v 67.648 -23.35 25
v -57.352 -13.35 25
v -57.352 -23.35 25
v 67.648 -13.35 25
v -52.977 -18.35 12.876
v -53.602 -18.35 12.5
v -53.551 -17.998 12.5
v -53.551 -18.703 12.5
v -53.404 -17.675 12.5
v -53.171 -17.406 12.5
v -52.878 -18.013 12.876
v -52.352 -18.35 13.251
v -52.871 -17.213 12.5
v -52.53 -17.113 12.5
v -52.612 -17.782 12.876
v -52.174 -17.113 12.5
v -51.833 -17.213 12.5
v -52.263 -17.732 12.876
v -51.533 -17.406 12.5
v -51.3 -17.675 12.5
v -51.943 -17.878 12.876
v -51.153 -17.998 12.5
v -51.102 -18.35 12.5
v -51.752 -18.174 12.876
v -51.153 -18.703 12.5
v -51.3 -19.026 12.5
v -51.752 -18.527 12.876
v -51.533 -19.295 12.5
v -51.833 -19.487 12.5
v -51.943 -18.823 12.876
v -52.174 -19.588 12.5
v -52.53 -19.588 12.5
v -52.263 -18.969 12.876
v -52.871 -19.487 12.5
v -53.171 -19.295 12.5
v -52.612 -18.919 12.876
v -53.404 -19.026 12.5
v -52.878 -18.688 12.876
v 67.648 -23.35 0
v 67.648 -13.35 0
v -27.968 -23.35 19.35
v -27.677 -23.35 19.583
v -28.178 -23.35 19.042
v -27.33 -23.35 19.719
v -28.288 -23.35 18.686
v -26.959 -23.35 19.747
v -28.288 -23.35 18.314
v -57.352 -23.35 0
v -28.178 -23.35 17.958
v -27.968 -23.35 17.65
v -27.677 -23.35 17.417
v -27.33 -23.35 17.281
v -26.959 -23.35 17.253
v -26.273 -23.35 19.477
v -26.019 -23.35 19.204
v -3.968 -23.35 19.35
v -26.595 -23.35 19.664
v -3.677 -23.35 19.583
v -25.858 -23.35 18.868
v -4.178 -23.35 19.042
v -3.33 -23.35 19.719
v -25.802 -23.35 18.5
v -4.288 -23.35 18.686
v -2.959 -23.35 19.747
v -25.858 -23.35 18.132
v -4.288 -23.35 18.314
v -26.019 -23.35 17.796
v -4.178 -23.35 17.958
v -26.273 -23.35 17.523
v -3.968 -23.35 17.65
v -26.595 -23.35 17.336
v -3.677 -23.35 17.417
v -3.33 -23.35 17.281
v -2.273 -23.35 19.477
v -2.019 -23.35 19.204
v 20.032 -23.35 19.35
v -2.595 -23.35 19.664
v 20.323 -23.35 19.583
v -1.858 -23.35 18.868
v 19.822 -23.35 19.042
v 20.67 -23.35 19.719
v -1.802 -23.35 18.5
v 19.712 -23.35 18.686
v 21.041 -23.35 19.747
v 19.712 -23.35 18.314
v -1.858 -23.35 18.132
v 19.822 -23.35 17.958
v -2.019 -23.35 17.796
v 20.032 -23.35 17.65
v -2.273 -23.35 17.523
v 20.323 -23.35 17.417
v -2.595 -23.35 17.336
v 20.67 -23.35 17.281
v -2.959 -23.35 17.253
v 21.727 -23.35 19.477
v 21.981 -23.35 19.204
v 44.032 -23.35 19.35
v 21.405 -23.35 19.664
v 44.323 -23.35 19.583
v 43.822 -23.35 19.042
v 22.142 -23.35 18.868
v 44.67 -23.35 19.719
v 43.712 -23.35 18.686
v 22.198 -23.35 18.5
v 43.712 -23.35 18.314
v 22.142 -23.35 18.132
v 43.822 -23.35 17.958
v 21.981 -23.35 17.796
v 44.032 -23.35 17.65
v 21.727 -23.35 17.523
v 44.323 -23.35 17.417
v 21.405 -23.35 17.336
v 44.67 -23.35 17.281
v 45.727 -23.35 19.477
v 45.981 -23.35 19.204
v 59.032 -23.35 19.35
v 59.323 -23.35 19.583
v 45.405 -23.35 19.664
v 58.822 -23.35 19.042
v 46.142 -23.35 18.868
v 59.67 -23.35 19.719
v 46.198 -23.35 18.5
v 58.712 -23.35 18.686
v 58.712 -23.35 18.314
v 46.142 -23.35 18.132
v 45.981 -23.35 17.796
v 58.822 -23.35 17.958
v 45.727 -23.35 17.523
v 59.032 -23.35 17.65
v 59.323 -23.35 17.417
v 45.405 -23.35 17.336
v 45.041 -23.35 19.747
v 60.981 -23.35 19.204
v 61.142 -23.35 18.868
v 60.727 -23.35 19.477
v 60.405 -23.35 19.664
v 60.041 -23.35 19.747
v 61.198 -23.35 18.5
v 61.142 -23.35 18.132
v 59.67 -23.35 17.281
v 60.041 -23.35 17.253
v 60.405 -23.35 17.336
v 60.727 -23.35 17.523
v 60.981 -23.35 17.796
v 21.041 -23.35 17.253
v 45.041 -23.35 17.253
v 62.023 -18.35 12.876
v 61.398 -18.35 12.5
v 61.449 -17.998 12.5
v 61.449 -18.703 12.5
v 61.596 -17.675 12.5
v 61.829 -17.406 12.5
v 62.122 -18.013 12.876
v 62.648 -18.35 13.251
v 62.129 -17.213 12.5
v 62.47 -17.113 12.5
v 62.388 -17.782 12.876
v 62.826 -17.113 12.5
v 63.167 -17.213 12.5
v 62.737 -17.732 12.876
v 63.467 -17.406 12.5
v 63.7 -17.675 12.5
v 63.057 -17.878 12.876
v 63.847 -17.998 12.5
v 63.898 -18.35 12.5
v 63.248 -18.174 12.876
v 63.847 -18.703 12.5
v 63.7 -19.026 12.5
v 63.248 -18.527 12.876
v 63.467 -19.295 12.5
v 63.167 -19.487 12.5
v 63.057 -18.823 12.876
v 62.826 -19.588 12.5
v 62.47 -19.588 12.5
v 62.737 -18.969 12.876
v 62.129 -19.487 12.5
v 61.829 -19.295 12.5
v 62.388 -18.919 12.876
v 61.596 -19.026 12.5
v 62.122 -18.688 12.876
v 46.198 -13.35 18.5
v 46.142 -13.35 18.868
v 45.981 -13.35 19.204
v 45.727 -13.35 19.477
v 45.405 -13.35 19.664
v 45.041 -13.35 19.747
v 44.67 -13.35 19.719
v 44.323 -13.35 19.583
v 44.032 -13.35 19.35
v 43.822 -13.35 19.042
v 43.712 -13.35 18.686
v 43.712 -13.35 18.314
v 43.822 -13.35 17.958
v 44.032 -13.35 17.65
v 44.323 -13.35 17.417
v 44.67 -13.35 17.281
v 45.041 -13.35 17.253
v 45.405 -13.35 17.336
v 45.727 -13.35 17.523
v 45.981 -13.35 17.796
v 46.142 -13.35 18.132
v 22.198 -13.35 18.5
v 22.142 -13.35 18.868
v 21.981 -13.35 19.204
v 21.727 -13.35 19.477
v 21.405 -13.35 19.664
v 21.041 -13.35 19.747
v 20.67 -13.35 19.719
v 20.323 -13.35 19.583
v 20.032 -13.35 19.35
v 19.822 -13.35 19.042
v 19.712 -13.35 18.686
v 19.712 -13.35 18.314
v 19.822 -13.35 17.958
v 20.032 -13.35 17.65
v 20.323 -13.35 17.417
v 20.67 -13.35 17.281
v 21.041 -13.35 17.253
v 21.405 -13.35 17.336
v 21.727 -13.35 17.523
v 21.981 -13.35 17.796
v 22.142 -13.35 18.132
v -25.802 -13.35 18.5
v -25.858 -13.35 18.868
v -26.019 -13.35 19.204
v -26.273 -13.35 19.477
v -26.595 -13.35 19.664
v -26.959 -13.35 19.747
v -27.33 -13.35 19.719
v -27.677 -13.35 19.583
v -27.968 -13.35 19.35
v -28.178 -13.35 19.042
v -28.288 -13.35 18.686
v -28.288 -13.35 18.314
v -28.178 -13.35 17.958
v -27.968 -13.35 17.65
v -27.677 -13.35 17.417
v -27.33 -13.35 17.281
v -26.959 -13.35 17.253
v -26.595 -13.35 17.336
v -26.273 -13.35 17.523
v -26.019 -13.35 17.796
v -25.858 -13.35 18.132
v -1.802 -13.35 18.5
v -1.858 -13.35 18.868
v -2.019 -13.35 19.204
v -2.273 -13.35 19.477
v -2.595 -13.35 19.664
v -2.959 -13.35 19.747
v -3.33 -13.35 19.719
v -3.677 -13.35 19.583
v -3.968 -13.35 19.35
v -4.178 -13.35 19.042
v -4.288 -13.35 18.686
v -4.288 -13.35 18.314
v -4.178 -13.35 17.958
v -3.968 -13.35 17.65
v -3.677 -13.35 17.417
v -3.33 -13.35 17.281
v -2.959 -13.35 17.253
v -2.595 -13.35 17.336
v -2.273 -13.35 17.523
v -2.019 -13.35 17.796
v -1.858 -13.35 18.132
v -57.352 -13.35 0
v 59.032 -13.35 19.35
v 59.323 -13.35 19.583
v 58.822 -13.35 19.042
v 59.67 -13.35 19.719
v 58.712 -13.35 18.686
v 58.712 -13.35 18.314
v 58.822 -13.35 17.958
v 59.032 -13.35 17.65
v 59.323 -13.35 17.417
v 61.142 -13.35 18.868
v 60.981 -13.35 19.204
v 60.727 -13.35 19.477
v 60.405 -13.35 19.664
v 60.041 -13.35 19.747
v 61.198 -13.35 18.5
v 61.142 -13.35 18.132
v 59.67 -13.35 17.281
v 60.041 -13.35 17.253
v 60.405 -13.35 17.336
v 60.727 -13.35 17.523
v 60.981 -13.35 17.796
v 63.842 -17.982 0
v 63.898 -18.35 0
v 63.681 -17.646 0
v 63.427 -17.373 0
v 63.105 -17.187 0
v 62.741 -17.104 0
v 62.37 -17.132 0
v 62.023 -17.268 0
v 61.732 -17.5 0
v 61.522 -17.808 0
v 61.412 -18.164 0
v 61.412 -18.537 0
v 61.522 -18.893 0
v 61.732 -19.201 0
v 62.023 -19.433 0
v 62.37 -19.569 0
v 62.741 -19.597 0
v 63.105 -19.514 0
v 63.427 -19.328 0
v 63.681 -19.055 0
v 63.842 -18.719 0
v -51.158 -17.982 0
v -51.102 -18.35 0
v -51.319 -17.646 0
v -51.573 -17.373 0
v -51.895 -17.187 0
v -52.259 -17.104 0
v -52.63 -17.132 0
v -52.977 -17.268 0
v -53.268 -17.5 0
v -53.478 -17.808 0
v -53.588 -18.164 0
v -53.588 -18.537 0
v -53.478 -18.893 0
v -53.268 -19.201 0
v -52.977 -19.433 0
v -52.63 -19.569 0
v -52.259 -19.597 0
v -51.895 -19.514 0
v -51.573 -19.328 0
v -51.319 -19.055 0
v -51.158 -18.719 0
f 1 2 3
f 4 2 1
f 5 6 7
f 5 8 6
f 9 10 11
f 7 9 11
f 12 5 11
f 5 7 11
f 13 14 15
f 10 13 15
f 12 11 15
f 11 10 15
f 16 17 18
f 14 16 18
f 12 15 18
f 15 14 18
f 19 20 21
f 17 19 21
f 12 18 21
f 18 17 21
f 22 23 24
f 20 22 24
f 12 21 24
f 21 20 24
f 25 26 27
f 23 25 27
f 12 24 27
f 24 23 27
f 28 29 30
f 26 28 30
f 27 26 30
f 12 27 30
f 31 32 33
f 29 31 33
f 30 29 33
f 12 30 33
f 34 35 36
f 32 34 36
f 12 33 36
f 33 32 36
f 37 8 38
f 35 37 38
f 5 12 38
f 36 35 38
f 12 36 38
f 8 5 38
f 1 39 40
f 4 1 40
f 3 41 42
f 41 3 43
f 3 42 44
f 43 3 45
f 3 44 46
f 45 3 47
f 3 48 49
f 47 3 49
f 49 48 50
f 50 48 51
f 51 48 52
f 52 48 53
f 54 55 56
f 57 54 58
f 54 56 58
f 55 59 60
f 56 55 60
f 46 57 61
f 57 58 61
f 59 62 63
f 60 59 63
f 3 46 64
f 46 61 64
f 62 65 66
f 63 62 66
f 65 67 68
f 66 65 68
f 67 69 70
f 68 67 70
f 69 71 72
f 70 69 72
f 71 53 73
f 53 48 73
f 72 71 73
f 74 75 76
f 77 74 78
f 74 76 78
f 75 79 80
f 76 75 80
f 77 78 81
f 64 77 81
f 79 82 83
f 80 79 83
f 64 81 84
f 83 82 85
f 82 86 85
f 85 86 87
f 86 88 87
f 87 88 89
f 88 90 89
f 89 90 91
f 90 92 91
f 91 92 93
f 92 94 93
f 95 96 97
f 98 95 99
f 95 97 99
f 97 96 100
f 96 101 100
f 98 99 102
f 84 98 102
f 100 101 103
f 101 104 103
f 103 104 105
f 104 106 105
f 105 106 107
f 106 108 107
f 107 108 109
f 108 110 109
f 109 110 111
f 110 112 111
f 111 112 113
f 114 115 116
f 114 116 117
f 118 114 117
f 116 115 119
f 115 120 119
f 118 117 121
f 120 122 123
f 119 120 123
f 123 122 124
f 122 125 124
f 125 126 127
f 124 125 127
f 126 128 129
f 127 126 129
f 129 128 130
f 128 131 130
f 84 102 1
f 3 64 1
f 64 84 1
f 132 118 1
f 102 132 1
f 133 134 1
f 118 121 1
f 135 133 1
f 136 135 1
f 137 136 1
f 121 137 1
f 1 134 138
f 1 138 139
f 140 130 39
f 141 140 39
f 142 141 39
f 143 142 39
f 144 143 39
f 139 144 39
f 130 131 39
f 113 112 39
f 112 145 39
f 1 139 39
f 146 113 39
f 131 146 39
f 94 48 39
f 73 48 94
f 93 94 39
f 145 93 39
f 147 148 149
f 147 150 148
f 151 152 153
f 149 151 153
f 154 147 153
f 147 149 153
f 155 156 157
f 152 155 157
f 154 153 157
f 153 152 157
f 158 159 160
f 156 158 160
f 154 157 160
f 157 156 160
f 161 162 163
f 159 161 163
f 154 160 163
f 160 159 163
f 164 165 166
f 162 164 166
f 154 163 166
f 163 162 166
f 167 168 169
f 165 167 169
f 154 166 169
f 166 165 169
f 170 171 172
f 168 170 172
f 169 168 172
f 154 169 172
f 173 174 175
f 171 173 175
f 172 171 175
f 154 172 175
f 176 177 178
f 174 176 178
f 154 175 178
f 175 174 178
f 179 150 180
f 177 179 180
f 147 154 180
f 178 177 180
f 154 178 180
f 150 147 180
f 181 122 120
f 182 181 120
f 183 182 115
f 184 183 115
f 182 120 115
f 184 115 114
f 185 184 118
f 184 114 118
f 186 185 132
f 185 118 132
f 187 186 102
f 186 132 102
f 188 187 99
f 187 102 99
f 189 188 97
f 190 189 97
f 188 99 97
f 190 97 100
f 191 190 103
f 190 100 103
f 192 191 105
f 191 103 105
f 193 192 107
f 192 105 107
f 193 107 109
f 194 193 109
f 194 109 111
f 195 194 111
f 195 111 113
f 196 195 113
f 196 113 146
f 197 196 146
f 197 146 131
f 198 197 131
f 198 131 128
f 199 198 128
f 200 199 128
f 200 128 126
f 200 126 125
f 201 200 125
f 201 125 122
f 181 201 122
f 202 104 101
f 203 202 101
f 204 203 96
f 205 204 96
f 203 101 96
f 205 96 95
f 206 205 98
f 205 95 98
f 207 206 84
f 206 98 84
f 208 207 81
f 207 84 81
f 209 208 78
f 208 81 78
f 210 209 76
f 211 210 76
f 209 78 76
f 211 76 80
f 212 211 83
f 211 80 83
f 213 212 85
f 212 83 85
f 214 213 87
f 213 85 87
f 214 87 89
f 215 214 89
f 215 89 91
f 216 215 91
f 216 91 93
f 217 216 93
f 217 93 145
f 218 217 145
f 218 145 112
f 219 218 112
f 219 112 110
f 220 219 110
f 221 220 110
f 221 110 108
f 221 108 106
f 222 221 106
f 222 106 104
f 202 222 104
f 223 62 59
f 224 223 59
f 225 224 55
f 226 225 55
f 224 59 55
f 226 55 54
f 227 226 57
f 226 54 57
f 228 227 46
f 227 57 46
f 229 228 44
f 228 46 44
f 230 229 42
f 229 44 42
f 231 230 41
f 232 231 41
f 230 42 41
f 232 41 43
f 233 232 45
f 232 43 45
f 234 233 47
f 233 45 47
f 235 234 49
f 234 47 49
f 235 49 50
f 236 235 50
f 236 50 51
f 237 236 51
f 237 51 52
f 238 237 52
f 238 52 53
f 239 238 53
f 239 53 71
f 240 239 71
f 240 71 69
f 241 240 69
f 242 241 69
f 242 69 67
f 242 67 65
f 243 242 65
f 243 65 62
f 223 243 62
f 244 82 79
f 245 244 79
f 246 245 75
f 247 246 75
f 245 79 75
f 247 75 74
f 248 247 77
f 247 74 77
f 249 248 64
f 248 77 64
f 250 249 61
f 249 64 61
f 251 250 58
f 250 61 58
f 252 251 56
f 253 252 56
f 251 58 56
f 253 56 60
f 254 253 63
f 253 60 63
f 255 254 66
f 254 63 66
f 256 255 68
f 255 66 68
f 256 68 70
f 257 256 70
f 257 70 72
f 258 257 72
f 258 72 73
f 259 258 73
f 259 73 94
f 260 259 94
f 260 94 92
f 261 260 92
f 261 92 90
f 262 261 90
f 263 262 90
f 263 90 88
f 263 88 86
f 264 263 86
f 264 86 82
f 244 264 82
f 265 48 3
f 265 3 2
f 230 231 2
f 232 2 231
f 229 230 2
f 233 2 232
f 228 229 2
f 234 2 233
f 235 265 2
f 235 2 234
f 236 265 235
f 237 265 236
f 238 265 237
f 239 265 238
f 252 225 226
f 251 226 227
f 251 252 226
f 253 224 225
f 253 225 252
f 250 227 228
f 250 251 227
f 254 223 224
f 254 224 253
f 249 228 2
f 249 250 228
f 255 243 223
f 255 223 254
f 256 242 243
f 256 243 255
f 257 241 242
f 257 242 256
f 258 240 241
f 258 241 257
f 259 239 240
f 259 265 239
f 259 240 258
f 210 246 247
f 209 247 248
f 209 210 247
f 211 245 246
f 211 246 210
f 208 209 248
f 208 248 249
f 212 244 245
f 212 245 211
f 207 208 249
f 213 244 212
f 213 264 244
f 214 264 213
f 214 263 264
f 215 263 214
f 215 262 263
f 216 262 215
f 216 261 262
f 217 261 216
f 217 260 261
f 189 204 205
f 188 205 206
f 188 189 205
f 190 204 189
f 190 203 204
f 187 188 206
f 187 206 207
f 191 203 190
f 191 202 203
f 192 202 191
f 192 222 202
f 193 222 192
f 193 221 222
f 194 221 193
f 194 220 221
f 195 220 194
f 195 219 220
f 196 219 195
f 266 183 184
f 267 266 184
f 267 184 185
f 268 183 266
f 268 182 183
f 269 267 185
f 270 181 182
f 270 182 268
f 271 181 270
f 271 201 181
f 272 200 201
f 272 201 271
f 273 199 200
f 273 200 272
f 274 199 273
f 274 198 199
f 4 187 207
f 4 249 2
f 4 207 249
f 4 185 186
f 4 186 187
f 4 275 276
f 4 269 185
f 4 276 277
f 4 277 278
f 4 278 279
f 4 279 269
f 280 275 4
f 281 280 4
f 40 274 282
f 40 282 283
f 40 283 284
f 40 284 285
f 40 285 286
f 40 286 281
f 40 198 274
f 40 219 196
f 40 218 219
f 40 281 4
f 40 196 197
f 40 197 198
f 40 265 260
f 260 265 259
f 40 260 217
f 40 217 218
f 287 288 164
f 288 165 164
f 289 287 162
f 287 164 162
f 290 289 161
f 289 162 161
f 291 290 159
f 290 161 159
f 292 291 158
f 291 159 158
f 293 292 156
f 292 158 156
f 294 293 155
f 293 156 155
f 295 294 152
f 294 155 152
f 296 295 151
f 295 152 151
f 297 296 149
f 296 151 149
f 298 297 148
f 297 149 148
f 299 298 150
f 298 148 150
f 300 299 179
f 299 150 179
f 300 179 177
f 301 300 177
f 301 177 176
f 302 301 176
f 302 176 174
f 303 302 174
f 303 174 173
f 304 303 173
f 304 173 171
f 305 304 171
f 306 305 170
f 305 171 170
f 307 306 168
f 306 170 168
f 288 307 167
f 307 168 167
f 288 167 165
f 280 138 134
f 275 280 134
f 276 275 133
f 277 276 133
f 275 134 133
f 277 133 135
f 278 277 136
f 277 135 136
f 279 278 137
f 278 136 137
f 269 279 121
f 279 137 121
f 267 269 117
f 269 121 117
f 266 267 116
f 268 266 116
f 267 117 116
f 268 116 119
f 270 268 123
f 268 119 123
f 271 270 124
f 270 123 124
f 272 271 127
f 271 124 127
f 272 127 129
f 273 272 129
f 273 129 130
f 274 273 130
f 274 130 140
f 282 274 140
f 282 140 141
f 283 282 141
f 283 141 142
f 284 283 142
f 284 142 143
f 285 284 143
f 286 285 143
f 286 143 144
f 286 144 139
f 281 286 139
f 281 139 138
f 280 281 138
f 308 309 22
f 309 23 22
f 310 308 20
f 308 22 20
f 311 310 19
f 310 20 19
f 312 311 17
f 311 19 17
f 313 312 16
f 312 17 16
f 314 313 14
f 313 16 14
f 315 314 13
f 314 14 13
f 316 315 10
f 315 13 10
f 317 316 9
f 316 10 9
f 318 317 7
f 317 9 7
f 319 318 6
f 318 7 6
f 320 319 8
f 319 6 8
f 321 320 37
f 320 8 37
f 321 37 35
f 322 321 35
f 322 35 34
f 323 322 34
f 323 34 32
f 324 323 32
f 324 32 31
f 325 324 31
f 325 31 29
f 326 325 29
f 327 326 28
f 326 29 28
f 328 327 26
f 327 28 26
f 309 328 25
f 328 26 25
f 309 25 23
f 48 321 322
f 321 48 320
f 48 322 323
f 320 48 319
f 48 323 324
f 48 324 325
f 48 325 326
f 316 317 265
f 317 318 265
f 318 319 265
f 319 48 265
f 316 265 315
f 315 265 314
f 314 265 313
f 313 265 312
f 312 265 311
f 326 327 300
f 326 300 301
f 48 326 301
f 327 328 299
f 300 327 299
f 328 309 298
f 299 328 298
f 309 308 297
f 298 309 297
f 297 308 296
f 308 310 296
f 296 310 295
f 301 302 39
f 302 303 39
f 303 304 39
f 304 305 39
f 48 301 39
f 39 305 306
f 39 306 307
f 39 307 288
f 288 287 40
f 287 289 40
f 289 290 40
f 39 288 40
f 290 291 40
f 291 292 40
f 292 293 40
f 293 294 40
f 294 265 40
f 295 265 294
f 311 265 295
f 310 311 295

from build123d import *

# Parameters (mm, degrees)
SKETCH_1_W      = 125
SKETCH_1_H      = 10
EXTRUDE_1_DEPTH = 25
M3X0_52_D       = 2.5
M3X0_52_DEPTH   = 12.5
M3X0_52_TIP     = 0.751075774
M3X0_51_D       = 2.5


with BuildPart() as part:
    # Эскиз1 → Бобышка-Вытянуть1 (new body)
    with BuildSketch(Plane.XY):
        with Locations((5.147947656, -18.350453001)):
            Rectangle(SKETCH_1_W, SKETCH_1_H)
    extrude(amount=EXTRUDE_1_DEPTH)

    # Отверстие обработанное метчиком M3x0.52
    with Locations(Plane(origin=(0, 0, 0), x_dir=(-1, 0, 0), z_dir=(0, 0, -1))):
        with Locations((-62.647947656, -18.350453001), (52.352052344, -18.350453001)):
            Hole(M3X0_52_D / 2, depth=M3X0_52_DEPTH)
            with Locations((0, 0, -(M3X0_52_DEPTH + M3X0_52_TIP / 2))):  # 118° drill point
                Cone(0, M3X0_52_D / 2, M3X0_52_TIP, mode=Mode.SUBTRACT)

    # Отверстие обработанное метчиком M3x0.51 (through all)
    with Locations(Plane(origin=(0, -13.350453001, 0), x_dir=(-1, 0, 0), z_dir=(0, 1, 0))):
        with Locations((-44.947947656, 18.5), (-20.947947656, 18.5), (3.052052344, 18.5), (27.052052344, 18.5), (-59.947947656, 18.5)):
            Hole(M3X0_51_D / 2)


solid = part.part
